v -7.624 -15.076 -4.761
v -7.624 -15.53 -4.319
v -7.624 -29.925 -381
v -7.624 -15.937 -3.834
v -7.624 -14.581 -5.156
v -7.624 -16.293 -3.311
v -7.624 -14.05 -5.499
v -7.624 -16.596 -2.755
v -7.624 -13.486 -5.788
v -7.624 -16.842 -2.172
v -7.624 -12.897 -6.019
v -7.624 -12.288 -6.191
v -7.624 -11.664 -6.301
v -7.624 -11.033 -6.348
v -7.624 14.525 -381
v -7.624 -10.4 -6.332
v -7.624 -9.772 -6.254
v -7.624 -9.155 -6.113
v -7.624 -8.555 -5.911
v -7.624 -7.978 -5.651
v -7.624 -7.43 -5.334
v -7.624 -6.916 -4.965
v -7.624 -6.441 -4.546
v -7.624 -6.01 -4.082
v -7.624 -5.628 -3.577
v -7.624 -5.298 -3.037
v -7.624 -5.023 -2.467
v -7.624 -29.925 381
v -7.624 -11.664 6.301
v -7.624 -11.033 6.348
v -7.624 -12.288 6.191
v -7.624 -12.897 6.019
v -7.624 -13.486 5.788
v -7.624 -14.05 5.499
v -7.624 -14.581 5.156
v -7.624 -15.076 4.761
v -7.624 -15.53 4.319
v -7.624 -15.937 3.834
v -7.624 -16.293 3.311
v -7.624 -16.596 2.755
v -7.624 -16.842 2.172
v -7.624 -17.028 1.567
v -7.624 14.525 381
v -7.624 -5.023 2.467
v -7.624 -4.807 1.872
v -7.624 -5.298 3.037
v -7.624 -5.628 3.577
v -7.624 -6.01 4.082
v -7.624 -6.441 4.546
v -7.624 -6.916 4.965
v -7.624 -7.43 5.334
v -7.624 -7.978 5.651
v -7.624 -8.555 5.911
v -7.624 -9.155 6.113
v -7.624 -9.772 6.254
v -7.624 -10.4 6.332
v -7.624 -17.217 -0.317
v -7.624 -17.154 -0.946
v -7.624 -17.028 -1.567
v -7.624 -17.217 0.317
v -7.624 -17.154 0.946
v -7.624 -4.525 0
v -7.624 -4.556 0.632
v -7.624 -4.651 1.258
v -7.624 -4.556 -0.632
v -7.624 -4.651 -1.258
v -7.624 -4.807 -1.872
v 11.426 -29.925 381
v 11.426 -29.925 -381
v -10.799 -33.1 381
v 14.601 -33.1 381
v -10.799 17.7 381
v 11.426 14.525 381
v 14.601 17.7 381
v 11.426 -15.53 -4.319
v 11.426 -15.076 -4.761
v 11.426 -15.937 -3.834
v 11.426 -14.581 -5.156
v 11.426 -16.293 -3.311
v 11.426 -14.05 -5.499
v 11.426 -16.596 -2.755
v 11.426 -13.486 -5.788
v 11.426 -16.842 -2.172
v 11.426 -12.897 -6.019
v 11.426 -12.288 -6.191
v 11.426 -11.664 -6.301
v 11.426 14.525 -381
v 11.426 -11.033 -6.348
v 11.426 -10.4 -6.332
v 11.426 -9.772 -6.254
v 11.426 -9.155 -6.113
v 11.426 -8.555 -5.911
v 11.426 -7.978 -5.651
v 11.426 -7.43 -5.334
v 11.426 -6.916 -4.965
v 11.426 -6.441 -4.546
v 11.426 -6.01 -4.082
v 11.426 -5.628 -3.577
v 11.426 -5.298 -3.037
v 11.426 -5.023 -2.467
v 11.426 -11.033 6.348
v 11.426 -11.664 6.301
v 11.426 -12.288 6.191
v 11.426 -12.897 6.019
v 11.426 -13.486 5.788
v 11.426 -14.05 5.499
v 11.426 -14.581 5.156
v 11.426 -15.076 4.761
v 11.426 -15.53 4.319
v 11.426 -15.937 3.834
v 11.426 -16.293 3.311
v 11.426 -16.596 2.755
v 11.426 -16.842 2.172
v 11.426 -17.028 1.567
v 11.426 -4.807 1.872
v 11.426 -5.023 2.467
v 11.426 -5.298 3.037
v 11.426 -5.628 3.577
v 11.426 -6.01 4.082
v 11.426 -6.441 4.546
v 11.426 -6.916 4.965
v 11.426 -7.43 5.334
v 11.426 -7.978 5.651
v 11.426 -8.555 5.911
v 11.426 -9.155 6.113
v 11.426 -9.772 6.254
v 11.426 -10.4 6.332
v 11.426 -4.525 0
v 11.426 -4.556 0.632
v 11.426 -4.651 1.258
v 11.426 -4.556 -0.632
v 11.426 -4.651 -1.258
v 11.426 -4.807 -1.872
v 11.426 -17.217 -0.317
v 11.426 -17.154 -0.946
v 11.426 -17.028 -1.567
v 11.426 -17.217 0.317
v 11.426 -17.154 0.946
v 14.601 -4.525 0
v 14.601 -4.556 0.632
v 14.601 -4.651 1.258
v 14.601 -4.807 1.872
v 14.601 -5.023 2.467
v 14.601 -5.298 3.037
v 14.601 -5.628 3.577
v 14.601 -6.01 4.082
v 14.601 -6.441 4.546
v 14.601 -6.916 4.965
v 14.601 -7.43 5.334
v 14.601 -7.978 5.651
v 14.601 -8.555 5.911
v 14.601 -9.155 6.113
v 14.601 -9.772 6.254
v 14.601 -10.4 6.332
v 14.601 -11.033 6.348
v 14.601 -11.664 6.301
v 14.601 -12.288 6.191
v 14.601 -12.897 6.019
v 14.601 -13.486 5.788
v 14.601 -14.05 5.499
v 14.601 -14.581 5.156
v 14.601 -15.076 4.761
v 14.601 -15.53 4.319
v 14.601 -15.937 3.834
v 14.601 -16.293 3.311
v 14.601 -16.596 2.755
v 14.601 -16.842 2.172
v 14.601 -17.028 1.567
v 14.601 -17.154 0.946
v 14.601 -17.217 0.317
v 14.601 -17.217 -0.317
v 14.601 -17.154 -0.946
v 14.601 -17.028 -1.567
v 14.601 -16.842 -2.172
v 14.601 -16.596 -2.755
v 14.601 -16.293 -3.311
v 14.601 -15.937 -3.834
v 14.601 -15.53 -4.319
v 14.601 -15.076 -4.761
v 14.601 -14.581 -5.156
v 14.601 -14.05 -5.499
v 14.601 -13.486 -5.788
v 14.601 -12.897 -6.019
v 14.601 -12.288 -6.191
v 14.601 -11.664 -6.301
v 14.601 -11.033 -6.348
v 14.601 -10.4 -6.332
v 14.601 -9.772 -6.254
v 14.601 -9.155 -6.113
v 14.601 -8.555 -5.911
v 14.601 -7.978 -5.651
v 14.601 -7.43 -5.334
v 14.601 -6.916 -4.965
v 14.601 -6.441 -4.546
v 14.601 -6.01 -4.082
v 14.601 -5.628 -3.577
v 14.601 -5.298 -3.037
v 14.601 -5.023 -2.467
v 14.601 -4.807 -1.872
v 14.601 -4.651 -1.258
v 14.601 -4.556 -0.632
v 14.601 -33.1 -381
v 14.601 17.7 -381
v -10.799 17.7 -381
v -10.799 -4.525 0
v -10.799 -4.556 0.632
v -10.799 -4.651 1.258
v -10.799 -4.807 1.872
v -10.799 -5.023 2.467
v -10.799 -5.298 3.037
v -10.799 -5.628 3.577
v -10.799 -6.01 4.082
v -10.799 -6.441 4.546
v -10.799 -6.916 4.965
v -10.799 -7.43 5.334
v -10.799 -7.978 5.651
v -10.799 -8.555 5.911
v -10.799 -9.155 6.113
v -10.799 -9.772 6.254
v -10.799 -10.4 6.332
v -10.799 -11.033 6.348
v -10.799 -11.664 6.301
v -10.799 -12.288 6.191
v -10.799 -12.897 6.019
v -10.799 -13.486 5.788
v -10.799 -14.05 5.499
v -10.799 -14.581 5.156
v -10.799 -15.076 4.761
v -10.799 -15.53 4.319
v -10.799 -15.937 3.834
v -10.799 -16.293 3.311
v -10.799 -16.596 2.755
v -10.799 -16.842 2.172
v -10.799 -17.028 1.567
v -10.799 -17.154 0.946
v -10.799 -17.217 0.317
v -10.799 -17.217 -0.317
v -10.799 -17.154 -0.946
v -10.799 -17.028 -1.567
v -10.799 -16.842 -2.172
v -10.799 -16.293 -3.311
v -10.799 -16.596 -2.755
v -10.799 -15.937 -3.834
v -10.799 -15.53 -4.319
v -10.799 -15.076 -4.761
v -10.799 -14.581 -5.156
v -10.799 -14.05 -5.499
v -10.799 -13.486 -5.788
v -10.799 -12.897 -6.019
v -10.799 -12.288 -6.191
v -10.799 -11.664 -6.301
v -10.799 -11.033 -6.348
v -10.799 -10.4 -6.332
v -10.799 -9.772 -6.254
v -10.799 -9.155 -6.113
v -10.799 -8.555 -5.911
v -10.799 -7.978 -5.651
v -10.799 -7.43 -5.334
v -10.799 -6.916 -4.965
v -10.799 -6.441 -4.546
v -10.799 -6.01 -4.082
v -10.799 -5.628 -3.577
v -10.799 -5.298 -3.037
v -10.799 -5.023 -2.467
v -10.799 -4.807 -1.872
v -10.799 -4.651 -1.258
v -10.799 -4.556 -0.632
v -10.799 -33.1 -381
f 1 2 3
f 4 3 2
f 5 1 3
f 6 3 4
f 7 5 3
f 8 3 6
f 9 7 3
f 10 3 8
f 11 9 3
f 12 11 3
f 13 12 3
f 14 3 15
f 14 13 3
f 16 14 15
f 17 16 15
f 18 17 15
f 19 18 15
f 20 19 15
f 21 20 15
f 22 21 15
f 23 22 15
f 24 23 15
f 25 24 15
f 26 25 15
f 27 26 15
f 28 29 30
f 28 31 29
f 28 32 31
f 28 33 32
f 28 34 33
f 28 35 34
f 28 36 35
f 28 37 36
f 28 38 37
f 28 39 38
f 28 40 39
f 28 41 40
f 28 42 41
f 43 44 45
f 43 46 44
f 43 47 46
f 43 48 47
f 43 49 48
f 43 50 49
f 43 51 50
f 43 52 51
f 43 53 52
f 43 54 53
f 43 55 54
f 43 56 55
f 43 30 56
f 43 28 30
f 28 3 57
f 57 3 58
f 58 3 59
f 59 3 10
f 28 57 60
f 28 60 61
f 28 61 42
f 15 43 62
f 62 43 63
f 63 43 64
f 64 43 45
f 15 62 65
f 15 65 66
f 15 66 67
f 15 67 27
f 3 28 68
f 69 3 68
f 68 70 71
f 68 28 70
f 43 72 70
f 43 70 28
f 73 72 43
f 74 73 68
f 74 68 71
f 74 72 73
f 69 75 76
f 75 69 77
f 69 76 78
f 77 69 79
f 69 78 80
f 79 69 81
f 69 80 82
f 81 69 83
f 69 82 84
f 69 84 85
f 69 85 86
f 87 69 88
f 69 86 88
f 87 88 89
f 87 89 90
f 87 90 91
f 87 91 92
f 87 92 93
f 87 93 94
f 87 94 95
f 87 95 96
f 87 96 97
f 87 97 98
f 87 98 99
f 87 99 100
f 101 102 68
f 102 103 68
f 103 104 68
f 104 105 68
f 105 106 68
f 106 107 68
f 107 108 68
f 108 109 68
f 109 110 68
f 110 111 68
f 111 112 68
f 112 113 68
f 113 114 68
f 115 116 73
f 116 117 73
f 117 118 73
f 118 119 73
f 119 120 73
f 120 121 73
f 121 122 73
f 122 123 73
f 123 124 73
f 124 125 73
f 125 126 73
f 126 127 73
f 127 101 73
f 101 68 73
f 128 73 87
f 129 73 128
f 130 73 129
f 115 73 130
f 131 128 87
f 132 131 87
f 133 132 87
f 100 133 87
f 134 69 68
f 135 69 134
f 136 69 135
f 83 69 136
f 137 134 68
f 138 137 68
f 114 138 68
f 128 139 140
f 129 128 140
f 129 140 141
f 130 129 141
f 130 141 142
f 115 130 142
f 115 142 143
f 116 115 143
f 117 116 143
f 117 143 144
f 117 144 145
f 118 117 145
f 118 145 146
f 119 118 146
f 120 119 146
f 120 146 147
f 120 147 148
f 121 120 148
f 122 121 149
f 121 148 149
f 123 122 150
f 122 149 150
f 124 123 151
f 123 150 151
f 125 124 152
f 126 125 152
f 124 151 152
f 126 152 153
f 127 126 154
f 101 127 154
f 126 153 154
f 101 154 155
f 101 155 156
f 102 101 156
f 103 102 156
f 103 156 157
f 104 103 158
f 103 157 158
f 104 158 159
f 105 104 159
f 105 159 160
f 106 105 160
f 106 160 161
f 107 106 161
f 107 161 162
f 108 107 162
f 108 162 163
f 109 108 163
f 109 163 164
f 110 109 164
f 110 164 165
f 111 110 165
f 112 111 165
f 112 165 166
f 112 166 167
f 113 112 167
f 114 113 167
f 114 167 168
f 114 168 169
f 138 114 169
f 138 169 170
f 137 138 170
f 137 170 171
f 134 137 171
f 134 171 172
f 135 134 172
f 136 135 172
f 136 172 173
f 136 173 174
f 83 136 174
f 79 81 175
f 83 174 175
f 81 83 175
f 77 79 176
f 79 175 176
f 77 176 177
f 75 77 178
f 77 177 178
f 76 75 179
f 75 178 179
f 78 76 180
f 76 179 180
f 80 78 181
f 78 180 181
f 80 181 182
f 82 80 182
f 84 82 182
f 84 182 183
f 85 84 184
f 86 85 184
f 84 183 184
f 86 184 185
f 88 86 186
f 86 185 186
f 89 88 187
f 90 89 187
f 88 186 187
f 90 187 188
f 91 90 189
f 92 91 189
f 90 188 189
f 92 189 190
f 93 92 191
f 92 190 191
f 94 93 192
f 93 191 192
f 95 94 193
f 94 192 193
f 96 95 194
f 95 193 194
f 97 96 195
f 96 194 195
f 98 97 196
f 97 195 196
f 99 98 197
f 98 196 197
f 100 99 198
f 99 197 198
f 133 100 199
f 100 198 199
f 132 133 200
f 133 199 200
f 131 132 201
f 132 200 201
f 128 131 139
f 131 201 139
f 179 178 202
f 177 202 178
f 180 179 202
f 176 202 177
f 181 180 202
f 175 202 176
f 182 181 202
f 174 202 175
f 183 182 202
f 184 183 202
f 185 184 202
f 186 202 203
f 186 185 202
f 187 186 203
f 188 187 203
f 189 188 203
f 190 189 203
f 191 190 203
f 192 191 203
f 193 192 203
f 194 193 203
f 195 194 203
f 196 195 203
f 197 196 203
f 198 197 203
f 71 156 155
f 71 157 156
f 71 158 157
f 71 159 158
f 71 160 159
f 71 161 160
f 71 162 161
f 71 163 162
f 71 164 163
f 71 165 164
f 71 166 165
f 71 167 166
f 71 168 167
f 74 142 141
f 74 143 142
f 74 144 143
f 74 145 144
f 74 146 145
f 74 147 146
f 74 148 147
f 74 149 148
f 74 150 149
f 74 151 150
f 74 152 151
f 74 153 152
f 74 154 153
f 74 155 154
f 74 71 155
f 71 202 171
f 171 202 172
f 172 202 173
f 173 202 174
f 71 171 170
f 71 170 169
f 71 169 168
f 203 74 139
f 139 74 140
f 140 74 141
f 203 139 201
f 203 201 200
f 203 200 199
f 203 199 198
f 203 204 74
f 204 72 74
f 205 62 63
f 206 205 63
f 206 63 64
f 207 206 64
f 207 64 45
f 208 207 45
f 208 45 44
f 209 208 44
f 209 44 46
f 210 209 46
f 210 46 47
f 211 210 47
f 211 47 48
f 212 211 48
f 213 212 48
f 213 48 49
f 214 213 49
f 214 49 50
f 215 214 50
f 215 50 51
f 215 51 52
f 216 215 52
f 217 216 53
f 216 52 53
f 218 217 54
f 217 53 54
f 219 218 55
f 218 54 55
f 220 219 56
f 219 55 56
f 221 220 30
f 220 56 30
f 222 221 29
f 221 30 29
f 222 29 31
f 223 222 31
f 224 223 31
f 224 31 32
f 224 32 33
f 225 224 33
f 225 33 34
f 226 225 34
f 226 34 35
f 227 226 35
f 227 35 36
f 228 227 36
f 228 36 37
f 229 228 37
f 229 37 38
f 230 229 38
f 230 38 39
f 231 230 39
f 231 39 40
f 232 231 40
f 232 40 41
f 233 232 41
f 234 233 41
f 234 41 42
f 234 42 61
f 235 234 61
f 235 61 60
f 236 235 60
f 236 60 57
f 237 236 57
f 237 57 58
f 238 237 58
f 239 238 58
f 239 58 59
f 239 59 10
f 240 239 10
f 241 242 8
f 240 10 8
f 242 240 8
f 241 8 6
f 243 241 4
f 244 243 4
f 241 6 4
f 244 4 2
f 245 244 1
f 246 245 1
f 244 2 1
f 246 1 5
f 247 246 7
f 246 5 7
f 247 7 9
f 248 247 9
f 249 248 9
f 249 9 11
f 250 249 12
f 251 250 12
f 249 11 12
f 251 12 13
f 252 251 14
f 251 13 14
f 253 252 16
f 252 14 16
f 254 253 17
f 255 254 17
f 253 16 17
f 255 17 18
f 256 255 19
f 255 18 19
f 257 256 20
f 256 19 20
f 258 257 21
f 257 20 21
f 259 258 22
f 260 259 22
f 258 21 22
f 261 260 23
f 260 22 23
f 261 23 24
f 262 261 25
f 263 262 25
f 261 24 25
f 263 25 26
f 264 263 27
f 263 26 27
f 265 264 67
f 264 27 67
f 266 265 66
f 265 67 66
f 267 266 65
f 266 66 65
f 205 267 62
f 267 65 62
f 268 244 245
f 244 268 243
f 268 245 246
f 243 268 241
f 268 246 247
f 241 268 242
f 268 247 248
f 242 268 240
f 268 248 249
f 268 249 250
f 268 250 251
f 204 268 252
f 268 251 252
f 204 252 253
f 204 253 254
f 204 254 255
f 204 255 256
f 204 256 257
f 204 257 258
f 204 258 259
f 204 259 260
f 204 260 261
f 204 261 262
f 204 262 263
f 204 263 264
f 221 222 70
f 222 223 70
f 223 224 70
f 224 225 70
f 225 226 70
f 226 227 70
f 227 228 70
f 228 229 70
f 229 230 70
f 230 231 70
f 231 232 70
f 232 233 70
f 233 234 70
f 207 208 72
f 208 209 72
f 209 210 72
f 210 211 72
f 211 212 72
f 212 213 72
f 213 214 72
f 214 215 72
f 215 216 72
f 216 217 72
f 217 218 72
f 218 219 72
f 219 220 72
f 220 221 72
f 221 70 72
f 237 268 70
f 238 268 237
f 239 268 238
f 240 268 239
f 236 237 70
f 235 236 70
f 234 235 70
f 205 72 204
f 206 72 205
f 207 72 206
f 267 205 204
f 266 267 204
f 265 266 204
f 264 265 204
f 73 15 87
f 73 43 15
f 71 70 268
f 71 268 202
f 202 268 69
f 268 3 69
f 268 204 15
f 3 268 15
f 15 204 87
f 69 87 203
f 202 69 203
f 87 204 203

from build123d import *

# Parameters (mm, degrees)
SKETCH1_W           = 25.4
SKETCH1_H           = 50.8
SKETCH1_W_2         = 19.05
SKETCH1_H_2         = 44.45
BOSS_EXTRUDE1_DEPTH = 381
SKETCH2_R           = 6.35
CUT_EXTRUDE1_DEPTH  = 25.4


with BuildPart() as part:
    # Sketch1 → Boss-Extrude1 (new, symmetric)
    with BuildSketch(Plane.XY):
        with Locations((1.901454405, -7.699719174)):
            Rectangle(SKETCH1_W, SKETCH1_H)
        with Locations((1.901454405, -7.699719174)):
            Rectangle(SKETCH1_W_2, SKETCH1_H_2, mode=Mode.SUBTRACT)
    extrude(amount=BOSS_EXTRUDE1_DEPTH, both=True)

    # Sketch2 → Cut-Extrude1 (cut)
    with BuildSketch(Plane(origin=(14.601454405, 0, 0), x_dir=(0, 0, -1), z_dir=(1, 0, 0))):
        with Locations(Location((0, -10.874719174, 0), (0, 0, 90))):
            Circle(SKETCH2_R)
    extrude(amount=-CUT_EXTRUDE1_DEPTH, mode=Mode.SUBTRACT)


solid = part.part
